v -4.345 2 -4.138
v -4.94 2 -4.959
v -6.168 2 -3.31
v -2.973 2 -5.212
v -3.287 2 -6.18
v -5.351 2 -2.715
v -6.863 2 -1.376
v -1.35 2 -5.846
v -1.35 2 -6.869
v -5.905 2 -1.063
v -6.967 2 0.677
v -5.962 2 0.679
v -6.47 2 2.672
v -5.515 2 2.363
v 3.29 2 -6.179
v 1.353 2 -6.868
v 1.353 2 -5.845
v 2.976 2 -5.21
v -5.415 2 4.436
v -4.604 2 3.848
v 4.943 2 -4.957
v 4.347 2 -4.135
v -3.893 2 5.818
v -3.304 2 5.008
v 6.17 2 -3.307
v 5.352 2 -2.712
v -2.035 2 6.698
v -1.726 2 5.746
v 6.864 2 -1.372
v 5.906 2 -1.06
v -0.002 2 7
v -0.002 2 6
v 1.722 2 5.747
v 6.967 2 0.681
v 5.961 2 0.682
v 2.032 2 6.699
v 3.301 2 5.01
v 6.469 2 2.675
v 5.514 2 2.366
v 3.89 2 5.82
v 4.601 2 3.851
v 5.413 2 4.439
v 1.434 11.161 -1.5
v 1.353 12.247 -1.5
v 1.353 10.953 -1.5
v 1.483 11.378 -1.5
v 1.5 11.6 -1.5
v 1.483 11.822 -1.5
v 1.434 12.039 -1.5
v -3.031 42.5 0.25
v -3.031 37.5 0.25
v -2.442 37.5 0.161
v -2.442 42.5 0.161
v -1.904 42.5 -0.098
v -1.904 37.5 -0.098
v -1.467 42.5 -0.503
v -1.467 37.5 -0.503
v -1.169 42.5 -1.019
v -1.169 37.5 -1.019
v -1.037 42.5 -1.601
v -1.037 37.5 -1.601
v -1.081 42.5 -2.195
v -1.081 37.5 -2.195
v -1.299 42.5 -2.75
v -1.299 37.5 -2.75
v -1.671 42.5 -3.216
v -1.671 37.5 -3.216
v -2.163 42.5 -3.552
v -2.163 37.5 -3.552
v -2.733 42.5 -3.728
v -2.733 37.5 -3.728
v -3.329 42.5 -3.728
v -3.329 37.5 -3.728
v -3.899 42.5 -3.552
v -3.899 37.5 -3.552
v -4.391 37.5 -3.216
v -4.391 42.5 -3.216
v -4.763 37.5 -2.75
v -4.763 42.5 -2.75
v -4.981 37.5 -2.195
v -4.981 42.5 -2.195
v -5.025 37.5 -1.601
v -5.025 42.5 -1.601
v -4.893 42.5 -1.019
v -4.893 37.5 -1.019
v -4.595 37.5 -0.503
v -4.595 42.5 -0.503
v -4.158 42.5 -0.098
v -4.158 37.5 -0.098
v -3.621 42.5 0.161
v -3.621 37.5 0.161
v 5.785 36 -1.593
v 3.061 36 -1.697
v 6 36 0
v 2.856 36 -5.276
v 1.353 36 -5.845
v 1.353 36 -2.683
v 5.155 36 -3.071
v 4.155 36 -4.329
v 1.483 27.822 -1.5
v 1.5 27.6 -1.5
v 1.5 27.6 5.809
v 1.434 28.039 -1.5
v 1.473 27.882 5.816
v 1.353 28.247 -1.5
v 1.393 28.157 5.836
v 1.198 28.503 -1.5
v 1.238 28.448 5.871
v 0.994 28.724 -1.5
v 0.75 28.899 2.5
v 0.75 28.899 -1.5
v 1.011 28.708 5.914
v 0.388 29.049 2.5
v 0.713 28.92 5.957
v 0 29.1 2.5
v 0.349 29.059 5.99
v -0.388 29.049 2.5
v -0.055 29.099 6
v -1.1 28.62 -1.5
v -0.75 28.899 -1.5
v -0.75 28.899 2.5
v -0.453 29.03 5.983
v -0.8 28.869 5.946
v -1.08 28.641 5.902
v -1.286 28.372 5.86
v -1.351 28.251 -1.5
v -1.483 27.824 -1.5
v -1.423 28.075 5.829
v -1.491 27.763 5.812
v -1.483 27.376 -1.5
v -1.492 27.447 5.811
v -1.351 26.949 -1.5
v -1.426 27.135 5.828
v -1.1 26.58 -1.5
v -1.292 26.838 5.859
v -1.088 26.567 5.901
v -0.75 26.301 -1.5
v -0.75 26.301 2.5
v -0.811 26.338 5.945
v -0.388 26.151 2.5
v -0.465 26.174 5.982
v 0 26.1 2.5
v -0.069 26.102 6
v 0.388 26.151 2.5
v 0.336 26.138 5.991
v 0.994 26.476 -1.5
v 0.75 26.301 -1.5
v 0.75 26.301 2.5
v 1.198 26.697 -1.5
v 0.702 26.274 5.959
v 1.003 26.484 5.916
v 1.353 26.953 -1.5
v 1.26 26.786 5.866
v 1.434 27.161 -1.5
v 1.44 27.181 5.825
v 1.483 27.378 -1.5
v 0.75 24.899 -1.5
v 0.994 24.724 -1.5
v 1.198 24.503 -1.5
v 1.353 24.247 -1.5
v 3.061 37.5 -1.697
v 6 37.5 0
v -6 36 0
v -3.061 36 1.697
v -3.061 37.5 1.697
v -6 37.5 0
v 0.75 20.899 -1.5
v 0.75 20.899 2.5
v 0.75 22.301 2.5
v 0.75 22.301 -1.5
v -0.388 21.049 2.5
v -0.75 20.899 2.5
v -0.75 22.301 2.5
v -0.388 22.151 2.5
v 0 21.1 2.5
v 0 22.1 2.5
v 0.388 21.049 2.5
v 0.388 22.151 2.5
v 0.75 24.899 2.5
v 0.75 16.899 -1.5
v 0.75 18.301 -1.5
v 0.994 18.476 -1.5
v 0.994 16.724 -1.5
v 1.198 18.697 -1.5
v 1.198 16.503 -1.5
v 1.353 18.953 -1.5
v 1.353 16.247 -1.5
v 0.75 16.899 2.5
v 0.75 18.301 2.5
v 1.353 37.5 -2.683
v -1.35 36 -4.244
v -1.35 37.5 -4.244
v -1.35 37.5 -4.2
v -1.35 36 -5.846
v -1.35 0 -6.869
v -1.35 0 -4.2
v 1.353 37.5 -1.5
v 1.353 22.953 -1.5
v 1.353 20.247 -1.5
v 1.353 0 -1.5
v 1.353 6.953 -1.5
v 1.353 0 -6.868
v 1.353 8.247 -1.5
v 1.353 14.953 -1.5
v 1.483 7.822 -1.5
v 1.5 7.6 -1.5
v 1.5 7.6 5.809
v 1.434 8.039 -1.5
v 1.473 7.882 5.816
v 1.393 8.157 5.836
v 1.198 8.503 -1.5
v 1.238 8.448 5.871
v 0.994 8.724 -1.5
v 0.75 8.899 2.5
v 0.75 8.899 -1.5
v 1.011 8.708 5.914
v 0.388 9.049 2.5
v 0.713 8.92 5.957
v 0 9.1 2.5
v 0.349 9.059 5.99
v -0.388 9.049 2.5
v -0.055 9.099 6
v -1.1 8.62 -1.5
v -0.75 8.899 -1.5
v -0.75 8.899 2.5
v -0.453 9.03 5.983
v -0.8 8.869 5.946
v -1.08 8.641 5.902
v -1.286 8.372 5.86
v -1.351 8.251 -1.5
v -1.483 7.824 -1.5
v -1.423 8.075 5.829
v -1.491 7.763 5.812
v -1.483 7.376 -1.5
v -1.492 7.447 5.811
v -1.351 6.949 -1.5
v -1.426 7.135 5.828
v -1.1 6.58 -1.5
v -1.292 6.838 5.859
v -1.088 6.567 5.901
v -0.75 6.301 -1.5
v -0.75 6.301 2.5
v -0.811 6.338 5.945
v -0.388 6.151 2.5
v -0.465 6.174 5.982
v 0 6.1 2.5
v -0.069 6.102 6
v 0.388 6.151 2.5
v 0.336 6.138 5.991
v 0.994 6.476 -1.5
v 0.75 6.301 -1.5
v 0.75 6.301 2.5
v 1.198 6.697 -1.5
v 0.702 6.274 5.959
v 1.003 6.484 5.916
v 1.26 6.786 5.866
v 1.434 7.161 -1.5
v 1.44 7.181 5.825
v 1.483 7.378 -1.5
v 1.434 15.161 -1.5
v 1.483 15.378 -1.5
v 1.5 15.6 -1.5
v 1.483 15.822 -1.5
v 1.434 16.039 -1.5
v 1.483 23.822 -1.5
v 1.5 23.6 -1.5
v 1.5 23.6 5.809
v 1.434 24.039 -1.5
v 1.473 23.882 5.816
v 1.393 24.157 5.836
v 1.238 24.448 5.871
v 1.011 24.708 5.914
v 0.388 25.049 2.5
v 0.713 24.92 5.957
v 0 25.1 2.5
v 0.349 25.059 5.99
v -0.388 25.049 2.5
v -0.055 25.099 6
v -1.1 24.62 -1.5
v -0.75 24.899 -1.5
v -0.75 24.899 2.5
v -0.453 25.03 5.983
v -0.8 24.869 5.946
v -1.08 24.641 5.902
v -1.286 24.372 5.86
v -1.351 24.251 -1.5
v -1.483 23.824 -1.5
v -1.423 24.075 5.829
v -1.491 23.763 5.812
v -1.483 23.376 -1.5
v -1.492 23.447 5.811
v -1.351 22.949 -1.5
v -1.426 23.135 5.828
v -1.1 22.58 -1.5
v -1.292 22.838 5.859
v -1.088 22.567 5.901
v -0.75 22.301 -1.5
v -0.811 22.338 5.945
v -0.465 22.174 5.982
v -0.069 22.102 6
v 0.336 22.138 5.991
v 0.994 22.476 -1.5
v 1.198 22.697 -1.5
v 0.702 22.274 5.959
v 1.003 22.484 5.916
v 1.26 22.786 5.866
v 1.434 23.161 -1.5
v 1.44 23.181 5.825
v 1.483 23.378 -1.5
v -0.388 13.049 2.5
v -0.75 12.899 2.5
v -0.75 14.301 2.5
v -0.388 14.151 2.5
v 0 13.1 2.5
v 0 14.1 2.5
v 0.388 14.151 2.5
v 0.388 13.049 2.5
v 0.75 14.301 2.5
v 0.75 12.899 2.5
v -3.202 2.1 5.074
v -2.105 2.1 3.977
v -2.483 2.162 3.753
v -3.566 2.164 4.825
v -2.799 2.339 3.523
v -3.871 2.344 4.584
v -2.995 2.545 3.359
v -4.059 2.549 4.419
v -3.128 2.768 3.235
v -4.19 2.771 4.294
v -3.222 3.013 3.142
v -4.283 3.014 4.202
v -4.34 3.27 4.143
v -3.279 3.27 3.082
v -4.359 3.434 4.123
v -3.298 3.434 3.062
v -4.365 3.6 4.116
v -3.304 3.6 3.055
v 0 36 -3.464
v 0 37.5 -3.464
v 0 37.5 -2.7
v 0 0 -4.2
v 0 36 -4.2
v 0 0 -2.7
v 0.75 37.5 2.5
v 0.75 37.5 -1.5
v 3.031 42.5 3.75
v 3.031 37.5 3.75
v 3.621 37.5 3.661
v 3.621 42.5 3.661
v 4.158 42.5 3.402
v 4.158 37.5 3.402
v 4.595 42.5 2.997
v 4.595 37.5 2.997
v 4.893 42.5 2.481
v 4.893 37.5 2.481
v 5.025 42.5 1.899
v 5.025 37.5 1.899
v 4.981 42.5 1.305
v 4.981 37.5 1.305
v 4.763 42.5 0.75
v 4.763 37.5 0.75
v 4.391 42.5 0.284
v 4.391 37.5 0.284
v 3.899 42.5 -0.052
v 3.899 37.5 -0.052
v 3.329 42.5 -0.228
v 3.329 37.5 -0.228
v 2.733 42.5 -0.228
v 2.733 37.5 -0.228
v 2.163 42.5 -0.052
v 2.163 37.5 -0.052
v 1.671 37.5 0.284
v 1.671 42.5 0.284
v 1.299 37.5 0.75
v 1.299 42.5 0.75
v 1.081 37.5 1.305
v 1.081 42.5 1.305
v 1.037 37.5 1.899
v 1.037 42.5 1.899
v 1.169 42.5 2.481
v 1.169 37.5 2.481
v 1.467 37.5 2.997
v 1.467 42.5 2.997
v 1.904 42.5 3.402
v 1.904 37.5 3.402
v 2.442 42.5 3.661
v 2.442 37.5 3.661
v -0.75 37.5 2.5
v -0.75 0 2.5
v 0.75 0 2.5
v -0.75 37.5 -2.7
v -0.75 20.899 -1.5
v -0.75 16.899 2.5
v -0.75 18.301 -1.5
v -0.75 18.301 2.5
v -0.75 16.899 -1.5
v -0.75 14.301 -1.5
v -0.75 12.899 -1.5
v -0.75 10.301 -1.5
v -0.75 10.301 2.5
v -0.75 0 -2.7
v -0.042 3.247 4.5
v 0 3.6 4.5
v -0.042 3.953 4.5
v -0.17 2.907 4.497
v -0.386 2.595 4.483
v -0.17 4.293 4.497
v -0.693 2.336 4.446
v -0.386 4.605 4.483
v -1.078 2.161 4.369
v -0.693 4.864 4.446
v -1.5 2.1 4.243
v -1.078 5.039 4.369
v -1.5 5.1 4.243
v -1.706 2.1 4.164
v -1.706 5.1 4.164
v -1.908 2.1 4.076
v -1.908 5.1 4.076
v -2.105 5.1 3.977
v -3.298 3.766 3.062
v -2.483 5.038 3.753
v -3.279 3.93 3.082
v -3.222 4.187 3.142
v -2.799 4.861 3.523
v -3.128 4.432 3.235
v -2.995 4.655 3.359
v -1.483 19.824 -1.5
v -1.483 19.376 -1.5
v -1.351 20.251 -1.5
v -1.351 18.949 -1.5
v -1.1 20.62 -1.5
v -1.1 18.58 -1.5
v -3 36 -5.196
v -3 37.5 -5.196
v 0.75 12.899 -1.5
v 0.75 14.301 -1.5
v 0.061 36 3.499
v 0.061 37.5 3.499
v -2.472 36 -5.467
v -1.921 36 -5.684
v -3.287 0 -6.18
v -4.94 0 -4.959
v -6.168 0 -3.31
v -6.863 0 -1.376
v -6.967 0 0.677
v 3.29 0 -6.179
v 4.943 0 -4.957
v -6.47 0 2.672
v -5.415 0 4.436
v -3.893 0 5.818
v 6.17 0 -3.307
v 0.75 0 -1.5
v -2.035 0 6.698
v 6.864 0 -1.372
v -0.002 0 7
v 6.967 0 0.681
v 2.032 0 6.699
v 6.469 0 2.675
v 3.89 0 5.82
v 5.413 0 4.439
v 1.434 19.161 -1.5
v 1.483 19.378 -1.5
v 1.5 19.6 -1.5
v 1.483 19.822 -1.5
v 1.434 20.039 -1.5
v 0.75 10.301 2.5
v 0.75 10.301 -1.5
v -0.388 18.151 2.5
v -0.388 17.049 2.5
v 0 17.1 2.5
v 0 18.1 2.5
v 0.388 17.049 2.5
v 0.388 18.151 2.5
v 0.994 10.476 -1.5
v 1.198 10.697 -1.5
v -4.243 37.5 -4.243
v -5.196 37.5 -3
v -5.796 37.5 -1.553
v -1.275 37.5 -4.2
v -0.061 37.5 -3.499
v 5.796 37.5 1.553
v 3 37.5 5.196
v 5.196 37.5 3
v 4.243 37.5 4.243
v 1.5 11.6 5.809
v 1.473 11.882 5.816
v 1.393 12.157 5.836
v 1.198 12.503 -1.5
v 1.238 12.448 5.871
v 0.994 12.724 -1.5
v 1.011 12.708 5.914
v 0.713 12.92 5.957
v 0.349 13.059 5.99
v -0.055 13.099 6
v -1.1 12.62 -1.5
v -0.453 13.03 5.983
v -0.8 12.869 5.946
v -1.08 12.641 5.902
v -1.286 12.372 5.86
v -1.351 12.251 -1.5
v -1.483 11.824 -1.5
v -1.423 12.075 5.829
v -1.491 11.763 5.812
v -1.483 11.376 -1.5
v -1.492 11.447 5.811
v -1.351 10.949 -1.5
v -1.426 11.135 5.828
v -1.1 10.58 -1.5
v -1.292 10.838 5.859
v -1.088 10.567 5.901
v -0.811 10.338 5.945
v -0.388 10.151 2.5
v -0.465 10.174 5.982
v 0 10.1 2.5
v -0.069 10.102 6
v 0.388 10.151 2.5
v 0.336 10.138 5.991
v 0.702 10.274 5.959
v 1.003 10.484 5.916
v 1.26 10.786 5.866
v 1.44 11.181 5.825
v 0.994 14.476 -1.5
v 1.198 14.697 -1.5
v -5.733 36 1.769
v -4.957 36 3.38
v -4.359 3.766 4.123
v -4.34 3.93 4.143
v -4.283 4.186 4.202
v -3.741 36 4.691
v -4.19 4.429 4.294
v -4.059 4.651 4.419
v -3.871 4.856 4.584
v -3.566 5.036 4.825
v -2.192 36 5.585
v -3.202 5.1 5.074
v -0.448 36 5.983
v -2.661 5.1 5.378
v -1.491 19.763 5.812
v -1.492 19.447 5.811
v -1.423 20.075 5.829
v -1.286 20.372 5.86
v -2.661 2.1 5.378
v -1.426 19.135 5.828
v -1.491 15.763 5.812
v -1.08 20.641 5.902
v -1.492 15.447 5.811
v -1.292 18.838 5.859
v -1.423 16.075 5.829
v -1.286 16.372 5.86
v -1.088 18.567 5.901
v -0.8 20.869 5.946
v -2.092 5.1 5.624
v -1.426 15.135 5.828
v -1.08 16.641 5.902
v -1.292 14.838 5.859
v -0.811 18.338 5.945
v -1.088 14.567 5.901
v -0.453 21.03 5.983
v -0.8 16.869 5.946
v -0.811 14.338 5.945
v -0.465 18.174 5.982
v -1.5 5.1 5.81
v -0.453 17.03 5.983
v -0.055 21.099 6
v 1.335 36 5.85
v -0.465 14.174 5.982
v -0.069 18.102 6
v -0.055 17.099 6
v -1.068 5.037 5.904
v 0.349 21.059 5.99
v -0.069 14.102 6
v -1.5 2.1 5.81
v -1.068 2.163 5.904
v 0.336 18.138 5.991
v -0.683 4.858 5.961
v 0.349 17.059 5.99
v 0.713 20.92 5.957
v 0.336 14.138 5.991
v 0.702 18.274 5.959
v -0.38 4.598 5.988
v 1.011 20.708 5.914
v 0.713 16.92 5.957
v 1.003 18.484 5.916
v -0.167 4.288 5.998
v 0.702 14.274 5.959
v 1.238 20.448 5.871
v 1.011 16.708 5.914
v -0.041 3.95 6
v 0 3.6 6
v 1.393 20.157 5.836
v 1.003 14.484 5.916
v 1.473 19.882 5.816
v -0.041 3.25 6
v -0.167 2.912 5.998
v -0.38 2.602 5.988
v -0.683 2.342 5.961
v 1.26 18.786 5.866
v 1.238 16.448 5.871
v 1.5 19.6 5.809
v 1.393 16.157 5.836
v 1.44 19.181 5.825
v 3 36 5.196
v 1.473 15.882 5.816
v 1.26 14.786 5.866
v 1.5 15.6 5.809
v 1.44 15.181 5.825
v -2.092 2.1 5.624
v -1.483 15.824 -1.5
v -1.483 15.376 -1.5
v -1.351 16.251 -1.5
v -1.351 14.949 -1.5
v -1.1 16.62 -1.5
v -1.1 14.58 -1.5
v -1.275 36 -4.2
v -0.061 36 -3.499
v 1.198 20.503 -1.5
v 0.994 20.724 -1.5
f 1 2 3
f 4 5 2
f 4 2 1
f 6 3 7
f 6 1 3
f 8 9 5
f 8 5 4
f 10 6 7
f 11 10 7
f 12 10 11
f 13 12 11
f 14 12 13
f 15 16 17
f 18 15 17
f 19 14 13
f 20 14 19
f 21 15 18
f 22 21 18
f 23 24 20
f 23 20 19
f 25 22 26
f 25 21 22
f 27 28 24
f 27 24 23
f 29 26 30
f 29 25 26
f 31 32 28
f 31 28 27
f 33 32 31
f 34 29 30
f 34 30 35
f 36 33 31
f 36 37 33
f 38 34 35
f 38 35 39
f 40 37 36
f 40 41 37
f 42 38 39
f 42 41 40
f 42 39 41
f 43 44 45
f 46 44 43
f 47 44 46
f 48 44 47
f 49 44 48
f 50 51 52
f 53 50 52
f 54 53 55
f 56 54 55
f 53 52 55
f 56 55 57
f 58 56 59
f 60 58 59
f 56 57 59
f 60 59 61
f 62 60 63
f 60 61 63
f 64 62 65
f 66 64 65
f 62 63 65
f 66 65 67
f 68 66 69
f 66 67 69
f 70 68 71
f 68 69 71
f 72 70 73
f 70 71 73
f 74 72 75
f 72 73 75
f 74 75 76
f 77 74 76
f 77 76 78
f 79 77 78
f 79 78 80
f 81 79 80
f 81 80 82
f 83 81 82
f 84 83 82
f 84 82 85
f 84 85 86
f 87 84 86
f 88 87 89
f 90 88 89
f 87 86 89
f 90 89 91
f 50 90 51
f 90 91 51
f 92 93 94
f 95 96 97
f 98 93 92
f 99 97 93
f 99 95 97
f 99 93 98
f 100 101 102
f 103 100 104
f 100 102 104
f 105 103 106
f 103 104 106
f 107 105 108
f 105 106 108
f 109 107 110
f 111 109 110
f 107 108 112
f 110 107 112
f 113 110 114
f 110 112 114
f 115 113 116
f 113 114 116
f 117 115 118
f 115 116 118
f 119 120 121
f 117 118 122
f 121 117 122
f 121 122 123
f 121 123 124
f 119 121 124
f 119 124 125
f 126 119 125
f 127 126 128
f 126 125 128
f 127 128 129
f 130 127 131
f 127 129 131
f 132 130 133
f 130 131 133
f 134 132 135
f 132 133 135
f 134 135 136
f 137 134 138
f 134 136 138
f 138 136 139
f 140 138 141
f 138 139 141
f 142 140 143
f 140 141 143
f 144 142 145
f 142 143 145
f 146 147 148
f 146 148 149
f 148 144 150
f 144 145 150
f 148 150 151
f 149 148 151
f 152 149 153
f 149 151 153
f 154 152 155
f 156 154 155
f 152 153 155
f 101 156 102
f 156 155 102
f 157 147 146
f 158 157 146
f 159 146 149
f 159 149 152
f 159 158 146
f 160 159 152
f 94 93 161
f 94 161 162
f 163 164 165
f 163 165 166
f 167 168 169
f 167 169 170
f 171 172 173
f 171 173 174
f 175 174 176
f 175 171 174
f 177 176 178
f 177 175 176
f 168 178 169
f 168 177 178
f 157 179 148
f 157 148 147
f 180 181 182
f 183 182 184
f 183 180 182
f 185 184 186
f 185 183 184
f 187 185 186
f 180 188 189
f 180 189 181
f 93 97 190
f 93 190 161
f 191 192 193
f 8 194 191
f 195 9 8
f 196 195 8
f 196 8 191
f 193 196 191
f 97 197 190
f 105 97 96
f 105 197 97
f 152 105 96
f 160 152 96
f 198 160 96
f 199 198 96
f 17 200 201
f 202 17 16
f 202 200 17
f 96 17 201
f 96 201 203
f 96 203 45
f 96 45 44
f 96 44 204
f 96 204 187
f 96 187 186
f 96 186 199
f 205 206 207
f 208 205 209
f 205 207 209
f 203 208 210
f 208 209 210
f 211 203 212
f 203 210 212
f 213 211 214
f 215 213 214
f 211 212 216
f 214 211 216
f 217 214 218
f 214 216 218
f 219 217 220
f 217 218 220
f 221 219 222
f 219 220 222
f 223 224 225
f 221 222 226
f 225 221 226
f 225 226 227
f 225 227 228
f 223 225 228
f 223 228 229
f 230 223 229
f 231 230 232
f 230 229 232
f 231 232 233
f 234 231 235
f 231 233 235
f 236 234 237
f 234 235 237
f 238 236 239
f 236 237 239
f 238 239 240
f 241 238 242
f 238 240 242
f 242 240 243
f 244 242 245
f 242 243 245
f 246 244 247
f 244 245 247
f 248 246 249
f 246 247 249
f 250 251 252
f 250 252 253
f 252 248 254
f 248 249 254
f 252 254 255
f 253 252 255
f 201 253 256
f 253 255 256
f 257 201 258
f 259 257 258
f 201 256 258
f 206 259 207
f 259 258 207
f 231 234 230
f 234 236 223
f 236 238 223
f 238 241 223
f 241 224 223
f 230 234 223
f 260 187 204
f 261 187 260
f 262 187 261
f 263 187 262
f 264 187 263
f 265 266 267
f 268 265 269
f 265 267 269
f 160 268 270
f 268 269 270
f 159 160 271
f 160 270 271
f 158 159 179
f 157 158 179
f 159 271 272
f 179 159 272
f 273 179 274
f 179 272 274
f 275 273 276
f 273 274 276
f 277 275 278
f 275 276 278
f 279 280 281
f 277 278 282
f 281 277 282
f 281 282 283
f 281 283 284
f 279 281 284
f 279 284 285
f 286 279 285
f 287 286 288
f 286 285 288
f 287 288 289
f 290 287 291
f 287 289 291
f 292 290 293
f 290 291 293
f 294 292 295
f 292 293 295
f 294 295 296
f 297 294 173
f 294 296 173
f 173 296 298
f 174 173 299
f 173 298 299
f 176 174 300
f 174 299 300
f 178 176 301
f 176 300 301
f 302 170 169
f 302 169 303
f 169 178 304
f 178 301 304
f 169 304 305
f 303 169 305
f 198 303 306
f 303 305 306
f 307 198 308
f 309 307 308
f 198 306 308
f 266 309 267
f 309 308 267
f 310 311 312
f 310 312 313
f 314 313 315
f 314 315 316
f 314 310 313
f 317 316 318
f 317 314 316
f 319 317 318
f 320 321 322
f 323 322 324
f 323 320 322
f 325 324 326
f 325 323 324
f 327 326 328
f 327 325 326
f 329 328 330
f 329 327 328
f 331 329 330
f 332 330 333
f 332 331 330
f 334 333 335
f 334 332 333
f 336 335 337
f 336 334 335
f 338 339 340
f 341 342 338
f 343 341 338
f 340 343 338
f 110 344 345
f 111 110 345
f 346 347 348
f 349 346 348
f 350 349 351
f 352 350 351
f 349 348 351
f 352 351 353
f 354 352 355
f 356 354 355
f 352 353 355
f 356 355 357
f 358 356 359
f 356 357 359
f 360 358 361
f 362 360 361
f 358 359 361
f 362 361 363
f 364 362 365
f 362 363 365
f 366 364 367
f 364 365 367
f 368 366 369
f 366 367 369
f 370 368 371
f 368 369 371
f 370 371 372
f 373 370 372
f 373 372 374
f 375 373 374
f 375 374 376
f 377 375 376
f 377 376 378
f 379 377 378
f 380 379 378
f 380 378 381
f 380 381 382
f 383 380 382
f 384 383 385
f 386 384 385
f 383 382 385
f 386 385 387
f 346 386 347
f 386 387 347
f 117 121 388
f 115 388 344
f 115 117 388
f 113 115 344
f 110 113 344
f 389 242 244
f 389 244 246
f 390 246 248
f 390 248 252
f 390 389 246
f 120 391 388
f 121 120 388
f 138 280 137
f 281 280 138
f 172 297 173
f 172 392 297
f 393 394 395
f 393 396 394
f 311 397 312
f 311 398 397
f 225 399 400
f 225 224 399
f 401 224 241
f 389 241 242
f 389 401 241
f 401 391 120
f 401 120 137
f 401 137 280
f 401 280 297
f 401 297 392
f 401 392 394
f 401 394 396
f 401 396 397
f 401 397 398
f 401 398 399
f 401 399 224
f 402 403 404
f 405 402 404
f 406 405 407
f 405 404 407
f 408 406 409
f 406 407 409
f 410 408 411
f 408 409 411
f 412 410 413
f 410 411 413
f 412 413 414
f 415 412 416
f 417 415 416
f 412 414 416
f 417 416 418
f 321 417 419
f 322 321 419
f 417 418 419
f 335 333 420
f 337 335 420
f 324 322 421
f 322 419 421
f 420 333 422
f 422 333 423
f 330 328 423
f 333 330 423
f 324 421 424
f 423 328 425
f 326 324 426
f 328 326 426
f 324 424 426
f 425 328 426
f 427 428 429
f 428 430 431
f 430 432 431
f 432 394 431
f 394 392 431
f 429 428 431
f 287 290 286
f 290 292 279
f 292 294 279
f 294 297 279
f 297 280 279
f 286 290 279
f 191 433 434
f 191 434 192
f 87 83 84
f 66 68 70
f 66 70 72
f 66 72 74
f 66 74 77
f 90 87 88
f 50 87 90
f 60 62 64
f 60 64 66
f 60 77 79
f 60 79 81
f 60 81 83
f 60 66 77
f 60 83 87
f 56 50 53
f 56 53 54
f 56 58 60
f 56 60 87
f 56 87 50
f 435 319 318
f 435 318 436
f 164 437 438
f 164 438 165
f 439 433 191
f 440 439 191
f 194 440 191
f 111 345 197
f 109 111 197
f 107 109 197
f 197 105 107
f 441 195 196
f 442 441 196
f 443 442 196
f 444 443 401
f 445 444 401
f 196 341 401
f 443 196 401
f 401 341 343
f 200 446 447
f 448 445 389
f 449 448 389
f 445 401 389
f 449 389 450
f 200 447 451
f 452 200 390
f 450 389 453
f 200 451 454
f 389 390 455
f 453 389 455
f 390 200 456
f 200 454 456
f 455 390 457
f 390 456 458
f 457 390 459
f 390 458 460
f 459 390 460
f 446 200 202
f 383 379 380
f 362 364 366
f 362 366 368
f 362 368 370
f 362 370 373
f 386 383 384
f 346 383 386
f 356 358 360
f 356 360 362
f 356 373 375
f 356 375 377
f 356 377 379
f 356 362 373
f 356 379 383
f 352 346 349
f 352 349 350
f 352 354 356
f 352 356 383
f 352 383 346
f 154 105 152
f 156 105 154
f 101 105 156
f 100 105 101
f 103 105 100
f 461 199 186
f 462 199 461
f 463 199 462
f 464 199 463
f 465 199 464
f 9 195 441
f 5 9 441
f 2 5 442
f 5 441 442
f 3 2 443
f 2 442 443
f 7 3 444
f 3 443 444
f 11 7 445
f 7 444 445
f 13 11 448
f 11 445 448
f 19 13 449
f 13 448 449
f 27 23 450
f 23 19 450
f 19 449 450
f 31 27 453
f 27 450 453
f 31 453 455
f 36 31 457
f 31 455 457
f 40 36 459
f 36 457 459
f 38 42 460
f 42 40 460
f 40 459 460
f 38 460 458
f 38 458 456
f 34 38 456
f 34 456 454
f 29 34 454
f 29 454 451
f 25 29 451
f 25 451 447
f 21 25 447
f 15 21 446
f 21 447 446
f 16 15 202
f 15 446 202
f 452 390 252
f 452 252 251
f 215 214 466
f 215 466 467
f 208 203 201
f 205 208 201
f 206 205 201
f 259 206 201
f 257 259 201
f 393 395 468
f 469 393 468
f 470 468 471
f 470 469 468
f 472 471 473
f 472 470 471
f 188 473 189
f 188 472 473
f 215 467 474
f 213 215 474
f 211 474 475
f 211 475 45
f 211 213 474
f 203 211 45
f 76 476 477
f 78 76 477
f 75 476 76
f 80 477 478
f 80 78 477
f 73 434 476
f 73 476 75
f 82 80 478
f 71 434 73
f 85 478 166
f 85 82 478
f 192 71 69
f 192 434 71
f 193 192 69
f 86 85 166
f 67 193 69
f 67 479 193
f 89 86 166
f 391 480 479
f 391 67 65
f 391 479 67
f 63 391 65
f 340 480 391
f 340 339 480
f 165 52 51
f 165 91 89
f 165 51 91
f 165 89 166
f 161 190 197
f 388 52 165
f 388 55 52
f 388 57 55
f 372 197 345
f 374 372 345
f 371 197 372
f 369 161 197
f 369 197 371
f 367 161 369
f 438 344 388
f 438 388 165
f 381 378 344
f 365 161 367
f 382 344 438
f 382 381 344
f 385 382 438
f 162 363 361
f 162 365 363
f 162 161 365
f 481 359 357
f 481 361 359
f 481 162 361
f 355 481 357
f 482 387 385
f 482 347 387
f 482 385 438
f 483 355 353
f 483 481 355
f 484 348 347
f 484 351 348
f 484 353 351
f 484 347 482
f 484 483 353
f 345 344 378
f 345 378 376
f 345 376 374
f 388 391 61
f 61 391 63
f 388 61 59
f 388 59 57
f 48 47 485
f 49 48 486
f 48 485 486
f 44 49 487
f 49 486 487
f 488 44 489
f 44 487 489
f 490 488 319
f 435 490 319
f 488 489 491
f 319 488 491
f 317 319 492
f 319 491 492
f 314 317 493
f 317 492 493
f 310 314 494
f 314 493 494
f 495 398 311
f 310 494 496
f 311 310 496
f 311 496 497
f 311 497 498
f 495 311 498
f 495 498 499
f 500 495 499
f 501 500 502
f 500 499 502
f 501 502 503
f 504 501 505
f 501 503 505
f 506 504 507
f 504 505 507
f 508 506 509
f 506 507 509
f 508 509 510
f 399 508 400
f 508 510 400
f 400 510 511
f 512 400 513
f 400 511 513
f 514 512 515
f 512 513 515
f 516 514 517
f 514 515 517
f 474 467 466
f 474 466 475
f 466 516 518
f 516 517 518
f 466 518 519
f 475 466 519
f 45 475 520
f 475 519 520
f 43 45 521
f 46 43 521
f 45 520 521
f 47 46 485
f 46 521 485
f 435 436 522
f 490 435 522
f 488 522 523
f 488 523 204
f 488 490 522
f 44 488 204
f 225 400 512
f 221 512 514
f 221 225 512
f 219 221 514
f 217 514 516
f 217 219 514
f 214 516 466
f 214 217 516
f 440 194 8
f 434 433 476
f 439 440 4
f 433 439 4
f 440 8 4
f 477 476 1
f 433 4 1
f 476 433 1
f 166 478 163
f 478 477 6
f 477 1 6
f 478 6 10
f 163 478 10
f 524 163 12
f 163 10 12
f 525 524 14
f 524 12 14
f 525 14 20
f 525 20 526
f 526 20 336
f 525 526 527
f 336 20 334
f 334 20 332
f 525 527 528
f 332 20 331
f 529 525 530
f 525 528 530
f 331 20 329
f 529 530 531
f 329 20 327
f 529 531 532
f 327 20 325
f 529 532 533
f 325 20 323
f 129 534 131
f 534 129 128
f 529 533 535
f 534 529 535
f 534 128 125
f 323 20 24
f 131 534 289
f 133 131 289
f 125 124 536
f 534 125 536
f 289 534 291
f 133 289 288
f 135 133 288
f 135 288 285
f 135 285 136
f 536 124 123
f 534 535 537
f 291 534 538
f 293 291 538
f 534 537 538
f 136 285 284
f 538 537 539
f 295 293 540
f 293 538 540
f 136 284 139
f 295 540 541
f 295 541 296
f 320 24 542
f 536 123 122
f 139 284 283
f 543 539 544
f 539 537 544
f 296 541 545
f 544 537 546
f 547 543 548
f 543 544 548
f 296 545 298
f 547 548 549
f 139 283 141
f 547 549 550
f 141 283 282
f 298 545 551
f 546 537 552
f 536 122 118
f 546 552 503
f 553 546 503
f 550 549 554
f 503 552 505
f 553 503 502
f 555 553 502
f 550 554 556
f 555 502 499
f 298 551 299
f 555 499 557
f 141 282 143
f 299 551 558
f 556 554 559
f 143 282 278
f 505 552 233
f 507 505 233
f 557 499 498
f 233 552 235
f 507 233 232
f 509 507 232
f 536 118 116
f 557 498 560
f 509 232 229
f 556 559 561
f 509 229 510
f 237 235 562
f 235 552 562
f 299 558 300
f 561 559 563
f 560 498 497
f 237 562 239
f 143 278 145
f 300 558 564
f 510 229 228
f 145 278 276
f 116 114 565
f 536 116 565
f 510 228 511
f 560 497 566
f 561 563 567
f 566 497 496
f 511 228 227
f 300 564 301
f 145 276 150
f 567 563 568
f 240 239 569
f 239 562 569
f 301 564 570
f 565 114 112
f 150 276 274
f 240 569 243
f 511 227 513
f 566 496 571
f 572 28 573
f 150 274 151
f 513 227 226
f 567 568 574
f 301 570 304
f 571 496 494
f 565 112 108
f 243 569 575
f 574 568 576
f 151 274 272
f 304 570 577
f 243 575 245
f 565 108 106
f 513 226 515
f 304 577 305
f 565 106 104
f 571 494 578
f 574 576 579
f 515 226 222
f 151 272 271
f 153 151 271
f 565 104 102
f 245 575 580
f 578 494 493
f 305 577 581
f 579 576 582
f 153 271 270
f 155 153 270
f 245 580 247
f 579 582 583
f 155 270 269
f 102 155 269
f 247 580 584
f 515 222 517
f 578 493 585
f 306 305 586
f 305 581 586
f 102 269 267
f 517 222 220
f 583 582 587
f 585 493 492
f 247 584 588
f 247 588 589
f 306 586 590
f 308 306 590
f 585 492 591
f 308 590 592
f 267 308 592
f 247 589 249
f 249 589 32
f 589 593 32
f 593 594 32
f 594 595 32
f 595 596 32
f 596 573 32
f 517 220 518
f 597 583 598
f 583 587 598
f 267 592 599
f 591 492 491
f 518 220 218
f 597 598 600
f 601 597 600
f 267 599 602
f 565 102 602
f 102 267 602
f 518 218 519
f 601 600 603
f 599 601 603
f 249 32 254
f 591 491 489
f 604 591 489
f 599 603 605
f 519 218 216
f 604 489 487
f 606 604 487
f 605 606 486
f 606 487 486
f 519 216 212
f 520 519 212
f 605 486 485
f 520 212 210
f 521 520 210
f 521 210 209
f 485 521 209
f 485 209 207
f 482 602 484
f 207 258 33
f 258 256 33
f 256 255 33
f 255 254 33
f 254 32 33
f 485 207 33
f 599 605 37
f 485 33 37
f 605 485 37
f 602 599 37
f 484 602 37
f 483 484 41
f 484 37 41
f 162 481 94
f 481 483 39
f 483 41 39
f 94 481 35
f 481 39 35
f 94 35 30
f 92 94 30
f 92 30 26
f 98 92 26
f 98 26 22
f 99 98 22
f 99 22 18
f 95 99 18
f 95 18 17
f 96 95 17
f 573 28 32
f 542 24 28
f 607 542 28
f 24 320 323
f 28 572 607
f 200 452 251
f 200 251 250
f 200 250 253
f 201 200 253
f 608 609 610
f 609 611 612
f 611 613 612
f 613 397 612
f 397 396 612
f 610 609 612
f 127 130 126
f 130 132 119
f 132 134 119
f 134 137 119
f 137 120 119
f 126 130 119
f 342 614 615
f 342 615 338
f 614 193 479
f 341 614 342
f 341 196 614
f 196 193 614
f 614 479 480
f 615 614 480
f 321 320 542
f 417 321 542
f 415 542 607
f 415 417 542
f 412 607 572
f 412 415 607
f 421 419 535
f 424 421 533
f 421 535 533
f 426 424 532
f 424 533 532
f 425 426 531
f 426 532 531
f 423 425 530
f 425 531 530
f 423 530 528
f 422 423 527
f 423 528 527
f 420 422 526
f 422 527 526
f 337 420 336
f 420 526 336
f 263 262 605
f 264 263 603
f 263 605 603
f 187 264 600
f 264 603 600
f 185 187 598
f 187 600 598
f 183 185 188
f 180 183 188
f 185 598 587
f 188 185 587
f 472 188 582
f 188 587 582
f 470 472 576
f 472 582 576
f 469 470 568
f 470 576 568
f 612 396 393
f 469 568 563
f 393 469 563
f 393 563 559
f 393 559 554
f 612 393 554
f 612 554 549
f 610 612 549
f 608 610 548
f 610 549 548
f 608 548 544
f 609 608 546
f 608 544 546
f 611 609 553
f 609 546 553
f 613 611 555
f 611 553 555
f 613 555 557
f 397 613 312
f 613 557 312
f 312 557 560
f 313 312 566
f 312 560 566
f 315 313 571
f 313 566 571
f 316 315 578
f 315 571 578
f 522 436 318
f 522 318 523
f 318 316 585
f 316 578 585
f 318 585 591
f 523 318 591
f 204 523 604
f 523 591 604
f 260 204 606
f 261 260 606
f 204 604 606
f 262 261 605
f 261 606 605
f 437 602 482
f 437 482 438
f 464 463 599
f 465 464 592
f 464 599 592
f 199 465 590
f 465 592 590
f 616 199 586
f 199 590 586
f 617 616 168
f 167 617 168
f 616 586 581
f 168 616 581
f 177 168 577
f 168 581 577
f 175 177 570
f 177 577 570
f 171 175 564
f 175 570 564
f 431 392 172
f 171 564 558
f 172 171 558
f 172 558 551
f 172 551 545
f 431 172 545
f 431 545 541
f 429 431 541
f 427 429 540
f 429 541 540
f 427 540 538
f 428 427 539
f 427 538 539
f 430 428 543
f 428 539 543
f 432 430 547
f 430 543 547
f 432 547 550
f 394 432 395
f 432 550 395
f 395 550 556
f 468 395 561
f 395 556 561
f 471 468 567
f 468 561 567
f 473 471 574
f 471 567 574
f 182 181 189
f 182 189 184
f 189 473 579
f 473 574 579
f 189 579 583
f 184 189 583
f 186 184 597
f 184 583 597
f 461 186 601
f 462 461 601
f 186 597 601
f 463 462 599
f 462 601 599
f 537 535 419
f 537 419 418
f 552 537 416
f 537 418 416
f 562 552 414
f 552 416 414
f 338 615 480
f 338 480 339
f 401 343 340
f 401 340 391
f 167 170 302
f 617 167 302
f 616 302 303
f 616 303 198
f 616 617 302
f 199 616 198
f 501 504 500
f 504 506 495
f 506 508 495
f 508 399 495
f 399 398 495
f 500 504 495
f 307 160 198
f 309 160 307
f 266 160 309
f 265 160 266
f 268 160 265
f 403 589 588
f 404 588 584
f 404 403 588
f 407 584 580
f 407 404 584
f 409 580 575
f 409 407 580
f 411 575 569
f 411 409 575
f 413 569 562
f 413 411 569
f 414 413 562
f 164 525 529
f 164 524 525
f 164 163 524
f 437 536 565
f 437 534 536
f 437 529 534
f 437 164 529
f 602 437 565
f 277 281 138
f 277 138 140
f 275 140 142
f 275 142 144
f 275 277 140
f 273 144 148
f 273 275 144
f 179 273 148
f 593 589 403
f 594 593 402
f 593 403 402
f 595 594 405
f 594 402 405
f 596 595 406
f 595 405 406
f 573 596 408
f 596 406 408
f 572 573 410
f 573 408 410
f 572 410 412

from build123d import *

# Parameters (mm, degrees)
SKETCH_1_R               = 7
EXTRUDE_1_DEPTH          = 2
SKETCH_2_R               = 6
EXTRUDE_2_DEPTH          = 35.5
CUT_EXTRUDE_1_DEPTH      = 39.784661917
CUT_EXTRUDE_1_DEPTH_BACK = 1.5
SKETCH_4_R               = 2
EXTRUDE_3_DEPTH          = 5
CUT_EXTRUDE_2_DEPTH      = 44.637713047
CUT_EXTRUDE_2_DEPTH_BACK = 44.637713047
CUT_EXTRUDE_6_OUTLINE_W  = 1.5
CUT_EXTRUDE_6_OUTLINE_H  = 7.50002714
PATTERN_LINEAR_2_COUNT   = 6
PATTERN_LINEAR_2_PITCH   = 4
CUT_EXTRUDE_7_DEPTH      = 1.5
FILLET_2_R               = 1.5
FILLET_3_R               = 1.5


# Read off the part's stored shape, not the designer's step: 切除-拉伸6
with BuildPart() as part:
    # 草图1 → 凸台-拉伸1 (new body)
    with BuildSketch(Plane(origin=(0, 0, 0), x_dir=(1, 0, 0), z_dir=(0, 1, 0))):
        with Locations(Location((0, 0, 0), (0, 0, 270))):
            Circle(SKETCH_1_R)
    extrude(amount=EXTRUDE_1_DEPTH)

    # 草图2 → 凸台-拉伸2 (add)
    with BuildSketch(Plane(origin=(0, 2, 0), x_dir=(1, 0, 0), z_dir=(0, 1, 0))):
        with Locations(Location((0, 0, 0), (0, 0, 270))):
            Circle(SKETCH_2_R)
    extrude(amount=EXTRUDE_2_DEPTH)

    # 草图3 → 切除-拉伸1 (cut, two sides: drawn at the far end of the back side and taken through both)
    with BuildSketch(Plane(origin=(0, 37.5, 0), x_dir=(1, 0, 0), z_dir=(0, 1, 0)).offset(-CUT_EXTRUDE_1_DEPTH_BACK)):
        with BuildLine():
            Line((0.0612495, -3.49946403), (-3.0612495, -1.696688392))
            ThreePointArc((-3.0612495, -1.696688392), (-1.75, -3.031088913), (0.0612495, -3.49946403))
        make_face()
        with BuildLine():
            ThreePointArc((0.0612495, -3.49946403), (-1.75, -3.031088913), (-3.0612495, -1.696688392))
            Line((-3.0612495, -1.696688392), (-6, 0))
            ThreePointArc((-6, 0), (-3, -5.196152423), (3, -5.196152423))
            Line((3, -5.196152423), (0.0612495, -3.49946403))
        make_face()
        with BuildLine():
            Line((-3, 5.196152423), (-0.0612495, 3.49946403))
            ThreePointArc((-0.0612495, 3.49946403), (1.75, 3.031088913), (3.0612495, 1.696688392))
            Line((3.0612495, 1.696688392), (6, 0))
            ThreePointArc((6, 0), (3, 5.196152423), (-3, 5.196152423))
        make_face()
        with BuildLine():
            ThreePointArc((3.0612495, 1.696688392), (1.75, 3.031088913), (-0.0612495, 3.49946403))
            Line((-0.0612495, 3.49946403), (3.0612495, 1.696688392))
        make_face()
    extrude(amount=CUT_EXTRUDE_1_DEPTH + CUT_EXTRUDE_1_DEPTH_BACK, mode=Mode.SUBTRACT)

    # 草图4 → 凸台-拉伸3 (add)
    with BuildSketch(Plane(origin=(0, 37.5, 0), x_dir=(1, 0, 0), z_dir=(0, 1, 0))):
        with Locations(Location((3.031088913, -1.75, 0), (0, 0, 270))):
            Circle(SKETCH_4_R)
        with Locations(Location((-3.031088913, 1.75, 0), (0, 0, 270))):
            Circle(SKETCH_4_R)
    extrude(amount=EXTRUDE_3_DEPTH)

    # 草图5 → 切除-拉伸2 (cut, two sides: drawn at the far end of the back side and taken through both)
    with BuildSketch(Plane(origin=(0, 0, 0), x_dir=(1, 0, 0), z_dir=(0, 1, 0)).offset(-CUT_EXTRUDE_2_DEPTH_BACK)):
        Polygon((-1.35, 49.247498963), (-1.35, 6.868587919), (-1.35, 4.2), (0, 4.2), (0, 2.7), (-0.75, 2.7), (-0.75, -2.5), (0.75, -2.5), (0.75, 1.5), (1.353400632, 1.5), (1.353400632, 6.867918661), (1.353400632, 49.246829705), (1.374383416, 134.004649195), (-1.329017216, 134.005318453), align=None)
    extrude(amount=CUT_EXTRUDE_2_DEPTH + CUT_EXTRUDE_2_DEPTH_BACK, mode=Mode.SUBTRACT)

    # 切除-拉伸6 outline → 切除-拉伸6 (revolve, cut)
    with BuildSketch(Plane.XZ.offset(-27.6)):
        with Locations((0.75, 2.25001357)):
            Rectangle(CUT_EXTRUDE_6_OUTLINE_W, CUT_EXTRUDE_6_OUTLINE_H)
    cut_extrude_6 = revolve(axis=Axis((0, 27.6, 0), (0, 0, 1)), mode=Mode.SUBTRACT)

    # 阵列(线性)2: 切除-拉伸6 ×6
    with Locations(*[(0, -i * PATTERN_LINEAR_2_PITCH, 0) for i in range(1, PATTERN_LINEAR_2_COUNT)]):
        add(cut_extrude_6, mode=Mode.SUBTRACT)

    # 草图15 → 切除-拉伸7 (cut, symmetric)
    with BuildSketch(Plane(origin=(0, 3.6, 0), x_dir=(1, 0, 0), z_dir=(0, 1, 0))):
        with BuildLine():
            Line((0, -6), (0, -4.5))
            ThreePointArc((0, -4.5), (-1.803051209, -4.122985125), (-3.303979251, -3.055113928))
            Line((-3.303979251, -3.055113928), (-4.36524821, -4.116382886))
            ThreePointArc((-4.36524821, -4.116382886), (-2.377151939, -5.509006141), (0, -6))
        make_face()
    extrude(amount=CUT_EXTRUDE_7_DEPTH, both=True, mode=Mode.SUBTRACT)

    # 圆角2
    fillet_2_edges = [part.edges().sort_by_distance(p)[0] for p in [
        (0, 5.1, 5.25),
        (0, 2.1, 5.25),
    ]]
    fillet(fillet_2_edges, radius=FILLET_2_R - 0.0001)  # a hair under: the kernel refuses the full size

    # 圆角3
    fillet_3_edges = [part.edges().sort_by_distance(p)[0] for p in [
        (-3.83461373, 2.1, 3.585748407),
        (-3.83461373, 5.1, 3.585748407),
    ]]
    fillet(fillet_3_edges, radius=FILLET_3_R - 0.0001)  # a hair under: the kernel refuses the full size


solid = part.part
